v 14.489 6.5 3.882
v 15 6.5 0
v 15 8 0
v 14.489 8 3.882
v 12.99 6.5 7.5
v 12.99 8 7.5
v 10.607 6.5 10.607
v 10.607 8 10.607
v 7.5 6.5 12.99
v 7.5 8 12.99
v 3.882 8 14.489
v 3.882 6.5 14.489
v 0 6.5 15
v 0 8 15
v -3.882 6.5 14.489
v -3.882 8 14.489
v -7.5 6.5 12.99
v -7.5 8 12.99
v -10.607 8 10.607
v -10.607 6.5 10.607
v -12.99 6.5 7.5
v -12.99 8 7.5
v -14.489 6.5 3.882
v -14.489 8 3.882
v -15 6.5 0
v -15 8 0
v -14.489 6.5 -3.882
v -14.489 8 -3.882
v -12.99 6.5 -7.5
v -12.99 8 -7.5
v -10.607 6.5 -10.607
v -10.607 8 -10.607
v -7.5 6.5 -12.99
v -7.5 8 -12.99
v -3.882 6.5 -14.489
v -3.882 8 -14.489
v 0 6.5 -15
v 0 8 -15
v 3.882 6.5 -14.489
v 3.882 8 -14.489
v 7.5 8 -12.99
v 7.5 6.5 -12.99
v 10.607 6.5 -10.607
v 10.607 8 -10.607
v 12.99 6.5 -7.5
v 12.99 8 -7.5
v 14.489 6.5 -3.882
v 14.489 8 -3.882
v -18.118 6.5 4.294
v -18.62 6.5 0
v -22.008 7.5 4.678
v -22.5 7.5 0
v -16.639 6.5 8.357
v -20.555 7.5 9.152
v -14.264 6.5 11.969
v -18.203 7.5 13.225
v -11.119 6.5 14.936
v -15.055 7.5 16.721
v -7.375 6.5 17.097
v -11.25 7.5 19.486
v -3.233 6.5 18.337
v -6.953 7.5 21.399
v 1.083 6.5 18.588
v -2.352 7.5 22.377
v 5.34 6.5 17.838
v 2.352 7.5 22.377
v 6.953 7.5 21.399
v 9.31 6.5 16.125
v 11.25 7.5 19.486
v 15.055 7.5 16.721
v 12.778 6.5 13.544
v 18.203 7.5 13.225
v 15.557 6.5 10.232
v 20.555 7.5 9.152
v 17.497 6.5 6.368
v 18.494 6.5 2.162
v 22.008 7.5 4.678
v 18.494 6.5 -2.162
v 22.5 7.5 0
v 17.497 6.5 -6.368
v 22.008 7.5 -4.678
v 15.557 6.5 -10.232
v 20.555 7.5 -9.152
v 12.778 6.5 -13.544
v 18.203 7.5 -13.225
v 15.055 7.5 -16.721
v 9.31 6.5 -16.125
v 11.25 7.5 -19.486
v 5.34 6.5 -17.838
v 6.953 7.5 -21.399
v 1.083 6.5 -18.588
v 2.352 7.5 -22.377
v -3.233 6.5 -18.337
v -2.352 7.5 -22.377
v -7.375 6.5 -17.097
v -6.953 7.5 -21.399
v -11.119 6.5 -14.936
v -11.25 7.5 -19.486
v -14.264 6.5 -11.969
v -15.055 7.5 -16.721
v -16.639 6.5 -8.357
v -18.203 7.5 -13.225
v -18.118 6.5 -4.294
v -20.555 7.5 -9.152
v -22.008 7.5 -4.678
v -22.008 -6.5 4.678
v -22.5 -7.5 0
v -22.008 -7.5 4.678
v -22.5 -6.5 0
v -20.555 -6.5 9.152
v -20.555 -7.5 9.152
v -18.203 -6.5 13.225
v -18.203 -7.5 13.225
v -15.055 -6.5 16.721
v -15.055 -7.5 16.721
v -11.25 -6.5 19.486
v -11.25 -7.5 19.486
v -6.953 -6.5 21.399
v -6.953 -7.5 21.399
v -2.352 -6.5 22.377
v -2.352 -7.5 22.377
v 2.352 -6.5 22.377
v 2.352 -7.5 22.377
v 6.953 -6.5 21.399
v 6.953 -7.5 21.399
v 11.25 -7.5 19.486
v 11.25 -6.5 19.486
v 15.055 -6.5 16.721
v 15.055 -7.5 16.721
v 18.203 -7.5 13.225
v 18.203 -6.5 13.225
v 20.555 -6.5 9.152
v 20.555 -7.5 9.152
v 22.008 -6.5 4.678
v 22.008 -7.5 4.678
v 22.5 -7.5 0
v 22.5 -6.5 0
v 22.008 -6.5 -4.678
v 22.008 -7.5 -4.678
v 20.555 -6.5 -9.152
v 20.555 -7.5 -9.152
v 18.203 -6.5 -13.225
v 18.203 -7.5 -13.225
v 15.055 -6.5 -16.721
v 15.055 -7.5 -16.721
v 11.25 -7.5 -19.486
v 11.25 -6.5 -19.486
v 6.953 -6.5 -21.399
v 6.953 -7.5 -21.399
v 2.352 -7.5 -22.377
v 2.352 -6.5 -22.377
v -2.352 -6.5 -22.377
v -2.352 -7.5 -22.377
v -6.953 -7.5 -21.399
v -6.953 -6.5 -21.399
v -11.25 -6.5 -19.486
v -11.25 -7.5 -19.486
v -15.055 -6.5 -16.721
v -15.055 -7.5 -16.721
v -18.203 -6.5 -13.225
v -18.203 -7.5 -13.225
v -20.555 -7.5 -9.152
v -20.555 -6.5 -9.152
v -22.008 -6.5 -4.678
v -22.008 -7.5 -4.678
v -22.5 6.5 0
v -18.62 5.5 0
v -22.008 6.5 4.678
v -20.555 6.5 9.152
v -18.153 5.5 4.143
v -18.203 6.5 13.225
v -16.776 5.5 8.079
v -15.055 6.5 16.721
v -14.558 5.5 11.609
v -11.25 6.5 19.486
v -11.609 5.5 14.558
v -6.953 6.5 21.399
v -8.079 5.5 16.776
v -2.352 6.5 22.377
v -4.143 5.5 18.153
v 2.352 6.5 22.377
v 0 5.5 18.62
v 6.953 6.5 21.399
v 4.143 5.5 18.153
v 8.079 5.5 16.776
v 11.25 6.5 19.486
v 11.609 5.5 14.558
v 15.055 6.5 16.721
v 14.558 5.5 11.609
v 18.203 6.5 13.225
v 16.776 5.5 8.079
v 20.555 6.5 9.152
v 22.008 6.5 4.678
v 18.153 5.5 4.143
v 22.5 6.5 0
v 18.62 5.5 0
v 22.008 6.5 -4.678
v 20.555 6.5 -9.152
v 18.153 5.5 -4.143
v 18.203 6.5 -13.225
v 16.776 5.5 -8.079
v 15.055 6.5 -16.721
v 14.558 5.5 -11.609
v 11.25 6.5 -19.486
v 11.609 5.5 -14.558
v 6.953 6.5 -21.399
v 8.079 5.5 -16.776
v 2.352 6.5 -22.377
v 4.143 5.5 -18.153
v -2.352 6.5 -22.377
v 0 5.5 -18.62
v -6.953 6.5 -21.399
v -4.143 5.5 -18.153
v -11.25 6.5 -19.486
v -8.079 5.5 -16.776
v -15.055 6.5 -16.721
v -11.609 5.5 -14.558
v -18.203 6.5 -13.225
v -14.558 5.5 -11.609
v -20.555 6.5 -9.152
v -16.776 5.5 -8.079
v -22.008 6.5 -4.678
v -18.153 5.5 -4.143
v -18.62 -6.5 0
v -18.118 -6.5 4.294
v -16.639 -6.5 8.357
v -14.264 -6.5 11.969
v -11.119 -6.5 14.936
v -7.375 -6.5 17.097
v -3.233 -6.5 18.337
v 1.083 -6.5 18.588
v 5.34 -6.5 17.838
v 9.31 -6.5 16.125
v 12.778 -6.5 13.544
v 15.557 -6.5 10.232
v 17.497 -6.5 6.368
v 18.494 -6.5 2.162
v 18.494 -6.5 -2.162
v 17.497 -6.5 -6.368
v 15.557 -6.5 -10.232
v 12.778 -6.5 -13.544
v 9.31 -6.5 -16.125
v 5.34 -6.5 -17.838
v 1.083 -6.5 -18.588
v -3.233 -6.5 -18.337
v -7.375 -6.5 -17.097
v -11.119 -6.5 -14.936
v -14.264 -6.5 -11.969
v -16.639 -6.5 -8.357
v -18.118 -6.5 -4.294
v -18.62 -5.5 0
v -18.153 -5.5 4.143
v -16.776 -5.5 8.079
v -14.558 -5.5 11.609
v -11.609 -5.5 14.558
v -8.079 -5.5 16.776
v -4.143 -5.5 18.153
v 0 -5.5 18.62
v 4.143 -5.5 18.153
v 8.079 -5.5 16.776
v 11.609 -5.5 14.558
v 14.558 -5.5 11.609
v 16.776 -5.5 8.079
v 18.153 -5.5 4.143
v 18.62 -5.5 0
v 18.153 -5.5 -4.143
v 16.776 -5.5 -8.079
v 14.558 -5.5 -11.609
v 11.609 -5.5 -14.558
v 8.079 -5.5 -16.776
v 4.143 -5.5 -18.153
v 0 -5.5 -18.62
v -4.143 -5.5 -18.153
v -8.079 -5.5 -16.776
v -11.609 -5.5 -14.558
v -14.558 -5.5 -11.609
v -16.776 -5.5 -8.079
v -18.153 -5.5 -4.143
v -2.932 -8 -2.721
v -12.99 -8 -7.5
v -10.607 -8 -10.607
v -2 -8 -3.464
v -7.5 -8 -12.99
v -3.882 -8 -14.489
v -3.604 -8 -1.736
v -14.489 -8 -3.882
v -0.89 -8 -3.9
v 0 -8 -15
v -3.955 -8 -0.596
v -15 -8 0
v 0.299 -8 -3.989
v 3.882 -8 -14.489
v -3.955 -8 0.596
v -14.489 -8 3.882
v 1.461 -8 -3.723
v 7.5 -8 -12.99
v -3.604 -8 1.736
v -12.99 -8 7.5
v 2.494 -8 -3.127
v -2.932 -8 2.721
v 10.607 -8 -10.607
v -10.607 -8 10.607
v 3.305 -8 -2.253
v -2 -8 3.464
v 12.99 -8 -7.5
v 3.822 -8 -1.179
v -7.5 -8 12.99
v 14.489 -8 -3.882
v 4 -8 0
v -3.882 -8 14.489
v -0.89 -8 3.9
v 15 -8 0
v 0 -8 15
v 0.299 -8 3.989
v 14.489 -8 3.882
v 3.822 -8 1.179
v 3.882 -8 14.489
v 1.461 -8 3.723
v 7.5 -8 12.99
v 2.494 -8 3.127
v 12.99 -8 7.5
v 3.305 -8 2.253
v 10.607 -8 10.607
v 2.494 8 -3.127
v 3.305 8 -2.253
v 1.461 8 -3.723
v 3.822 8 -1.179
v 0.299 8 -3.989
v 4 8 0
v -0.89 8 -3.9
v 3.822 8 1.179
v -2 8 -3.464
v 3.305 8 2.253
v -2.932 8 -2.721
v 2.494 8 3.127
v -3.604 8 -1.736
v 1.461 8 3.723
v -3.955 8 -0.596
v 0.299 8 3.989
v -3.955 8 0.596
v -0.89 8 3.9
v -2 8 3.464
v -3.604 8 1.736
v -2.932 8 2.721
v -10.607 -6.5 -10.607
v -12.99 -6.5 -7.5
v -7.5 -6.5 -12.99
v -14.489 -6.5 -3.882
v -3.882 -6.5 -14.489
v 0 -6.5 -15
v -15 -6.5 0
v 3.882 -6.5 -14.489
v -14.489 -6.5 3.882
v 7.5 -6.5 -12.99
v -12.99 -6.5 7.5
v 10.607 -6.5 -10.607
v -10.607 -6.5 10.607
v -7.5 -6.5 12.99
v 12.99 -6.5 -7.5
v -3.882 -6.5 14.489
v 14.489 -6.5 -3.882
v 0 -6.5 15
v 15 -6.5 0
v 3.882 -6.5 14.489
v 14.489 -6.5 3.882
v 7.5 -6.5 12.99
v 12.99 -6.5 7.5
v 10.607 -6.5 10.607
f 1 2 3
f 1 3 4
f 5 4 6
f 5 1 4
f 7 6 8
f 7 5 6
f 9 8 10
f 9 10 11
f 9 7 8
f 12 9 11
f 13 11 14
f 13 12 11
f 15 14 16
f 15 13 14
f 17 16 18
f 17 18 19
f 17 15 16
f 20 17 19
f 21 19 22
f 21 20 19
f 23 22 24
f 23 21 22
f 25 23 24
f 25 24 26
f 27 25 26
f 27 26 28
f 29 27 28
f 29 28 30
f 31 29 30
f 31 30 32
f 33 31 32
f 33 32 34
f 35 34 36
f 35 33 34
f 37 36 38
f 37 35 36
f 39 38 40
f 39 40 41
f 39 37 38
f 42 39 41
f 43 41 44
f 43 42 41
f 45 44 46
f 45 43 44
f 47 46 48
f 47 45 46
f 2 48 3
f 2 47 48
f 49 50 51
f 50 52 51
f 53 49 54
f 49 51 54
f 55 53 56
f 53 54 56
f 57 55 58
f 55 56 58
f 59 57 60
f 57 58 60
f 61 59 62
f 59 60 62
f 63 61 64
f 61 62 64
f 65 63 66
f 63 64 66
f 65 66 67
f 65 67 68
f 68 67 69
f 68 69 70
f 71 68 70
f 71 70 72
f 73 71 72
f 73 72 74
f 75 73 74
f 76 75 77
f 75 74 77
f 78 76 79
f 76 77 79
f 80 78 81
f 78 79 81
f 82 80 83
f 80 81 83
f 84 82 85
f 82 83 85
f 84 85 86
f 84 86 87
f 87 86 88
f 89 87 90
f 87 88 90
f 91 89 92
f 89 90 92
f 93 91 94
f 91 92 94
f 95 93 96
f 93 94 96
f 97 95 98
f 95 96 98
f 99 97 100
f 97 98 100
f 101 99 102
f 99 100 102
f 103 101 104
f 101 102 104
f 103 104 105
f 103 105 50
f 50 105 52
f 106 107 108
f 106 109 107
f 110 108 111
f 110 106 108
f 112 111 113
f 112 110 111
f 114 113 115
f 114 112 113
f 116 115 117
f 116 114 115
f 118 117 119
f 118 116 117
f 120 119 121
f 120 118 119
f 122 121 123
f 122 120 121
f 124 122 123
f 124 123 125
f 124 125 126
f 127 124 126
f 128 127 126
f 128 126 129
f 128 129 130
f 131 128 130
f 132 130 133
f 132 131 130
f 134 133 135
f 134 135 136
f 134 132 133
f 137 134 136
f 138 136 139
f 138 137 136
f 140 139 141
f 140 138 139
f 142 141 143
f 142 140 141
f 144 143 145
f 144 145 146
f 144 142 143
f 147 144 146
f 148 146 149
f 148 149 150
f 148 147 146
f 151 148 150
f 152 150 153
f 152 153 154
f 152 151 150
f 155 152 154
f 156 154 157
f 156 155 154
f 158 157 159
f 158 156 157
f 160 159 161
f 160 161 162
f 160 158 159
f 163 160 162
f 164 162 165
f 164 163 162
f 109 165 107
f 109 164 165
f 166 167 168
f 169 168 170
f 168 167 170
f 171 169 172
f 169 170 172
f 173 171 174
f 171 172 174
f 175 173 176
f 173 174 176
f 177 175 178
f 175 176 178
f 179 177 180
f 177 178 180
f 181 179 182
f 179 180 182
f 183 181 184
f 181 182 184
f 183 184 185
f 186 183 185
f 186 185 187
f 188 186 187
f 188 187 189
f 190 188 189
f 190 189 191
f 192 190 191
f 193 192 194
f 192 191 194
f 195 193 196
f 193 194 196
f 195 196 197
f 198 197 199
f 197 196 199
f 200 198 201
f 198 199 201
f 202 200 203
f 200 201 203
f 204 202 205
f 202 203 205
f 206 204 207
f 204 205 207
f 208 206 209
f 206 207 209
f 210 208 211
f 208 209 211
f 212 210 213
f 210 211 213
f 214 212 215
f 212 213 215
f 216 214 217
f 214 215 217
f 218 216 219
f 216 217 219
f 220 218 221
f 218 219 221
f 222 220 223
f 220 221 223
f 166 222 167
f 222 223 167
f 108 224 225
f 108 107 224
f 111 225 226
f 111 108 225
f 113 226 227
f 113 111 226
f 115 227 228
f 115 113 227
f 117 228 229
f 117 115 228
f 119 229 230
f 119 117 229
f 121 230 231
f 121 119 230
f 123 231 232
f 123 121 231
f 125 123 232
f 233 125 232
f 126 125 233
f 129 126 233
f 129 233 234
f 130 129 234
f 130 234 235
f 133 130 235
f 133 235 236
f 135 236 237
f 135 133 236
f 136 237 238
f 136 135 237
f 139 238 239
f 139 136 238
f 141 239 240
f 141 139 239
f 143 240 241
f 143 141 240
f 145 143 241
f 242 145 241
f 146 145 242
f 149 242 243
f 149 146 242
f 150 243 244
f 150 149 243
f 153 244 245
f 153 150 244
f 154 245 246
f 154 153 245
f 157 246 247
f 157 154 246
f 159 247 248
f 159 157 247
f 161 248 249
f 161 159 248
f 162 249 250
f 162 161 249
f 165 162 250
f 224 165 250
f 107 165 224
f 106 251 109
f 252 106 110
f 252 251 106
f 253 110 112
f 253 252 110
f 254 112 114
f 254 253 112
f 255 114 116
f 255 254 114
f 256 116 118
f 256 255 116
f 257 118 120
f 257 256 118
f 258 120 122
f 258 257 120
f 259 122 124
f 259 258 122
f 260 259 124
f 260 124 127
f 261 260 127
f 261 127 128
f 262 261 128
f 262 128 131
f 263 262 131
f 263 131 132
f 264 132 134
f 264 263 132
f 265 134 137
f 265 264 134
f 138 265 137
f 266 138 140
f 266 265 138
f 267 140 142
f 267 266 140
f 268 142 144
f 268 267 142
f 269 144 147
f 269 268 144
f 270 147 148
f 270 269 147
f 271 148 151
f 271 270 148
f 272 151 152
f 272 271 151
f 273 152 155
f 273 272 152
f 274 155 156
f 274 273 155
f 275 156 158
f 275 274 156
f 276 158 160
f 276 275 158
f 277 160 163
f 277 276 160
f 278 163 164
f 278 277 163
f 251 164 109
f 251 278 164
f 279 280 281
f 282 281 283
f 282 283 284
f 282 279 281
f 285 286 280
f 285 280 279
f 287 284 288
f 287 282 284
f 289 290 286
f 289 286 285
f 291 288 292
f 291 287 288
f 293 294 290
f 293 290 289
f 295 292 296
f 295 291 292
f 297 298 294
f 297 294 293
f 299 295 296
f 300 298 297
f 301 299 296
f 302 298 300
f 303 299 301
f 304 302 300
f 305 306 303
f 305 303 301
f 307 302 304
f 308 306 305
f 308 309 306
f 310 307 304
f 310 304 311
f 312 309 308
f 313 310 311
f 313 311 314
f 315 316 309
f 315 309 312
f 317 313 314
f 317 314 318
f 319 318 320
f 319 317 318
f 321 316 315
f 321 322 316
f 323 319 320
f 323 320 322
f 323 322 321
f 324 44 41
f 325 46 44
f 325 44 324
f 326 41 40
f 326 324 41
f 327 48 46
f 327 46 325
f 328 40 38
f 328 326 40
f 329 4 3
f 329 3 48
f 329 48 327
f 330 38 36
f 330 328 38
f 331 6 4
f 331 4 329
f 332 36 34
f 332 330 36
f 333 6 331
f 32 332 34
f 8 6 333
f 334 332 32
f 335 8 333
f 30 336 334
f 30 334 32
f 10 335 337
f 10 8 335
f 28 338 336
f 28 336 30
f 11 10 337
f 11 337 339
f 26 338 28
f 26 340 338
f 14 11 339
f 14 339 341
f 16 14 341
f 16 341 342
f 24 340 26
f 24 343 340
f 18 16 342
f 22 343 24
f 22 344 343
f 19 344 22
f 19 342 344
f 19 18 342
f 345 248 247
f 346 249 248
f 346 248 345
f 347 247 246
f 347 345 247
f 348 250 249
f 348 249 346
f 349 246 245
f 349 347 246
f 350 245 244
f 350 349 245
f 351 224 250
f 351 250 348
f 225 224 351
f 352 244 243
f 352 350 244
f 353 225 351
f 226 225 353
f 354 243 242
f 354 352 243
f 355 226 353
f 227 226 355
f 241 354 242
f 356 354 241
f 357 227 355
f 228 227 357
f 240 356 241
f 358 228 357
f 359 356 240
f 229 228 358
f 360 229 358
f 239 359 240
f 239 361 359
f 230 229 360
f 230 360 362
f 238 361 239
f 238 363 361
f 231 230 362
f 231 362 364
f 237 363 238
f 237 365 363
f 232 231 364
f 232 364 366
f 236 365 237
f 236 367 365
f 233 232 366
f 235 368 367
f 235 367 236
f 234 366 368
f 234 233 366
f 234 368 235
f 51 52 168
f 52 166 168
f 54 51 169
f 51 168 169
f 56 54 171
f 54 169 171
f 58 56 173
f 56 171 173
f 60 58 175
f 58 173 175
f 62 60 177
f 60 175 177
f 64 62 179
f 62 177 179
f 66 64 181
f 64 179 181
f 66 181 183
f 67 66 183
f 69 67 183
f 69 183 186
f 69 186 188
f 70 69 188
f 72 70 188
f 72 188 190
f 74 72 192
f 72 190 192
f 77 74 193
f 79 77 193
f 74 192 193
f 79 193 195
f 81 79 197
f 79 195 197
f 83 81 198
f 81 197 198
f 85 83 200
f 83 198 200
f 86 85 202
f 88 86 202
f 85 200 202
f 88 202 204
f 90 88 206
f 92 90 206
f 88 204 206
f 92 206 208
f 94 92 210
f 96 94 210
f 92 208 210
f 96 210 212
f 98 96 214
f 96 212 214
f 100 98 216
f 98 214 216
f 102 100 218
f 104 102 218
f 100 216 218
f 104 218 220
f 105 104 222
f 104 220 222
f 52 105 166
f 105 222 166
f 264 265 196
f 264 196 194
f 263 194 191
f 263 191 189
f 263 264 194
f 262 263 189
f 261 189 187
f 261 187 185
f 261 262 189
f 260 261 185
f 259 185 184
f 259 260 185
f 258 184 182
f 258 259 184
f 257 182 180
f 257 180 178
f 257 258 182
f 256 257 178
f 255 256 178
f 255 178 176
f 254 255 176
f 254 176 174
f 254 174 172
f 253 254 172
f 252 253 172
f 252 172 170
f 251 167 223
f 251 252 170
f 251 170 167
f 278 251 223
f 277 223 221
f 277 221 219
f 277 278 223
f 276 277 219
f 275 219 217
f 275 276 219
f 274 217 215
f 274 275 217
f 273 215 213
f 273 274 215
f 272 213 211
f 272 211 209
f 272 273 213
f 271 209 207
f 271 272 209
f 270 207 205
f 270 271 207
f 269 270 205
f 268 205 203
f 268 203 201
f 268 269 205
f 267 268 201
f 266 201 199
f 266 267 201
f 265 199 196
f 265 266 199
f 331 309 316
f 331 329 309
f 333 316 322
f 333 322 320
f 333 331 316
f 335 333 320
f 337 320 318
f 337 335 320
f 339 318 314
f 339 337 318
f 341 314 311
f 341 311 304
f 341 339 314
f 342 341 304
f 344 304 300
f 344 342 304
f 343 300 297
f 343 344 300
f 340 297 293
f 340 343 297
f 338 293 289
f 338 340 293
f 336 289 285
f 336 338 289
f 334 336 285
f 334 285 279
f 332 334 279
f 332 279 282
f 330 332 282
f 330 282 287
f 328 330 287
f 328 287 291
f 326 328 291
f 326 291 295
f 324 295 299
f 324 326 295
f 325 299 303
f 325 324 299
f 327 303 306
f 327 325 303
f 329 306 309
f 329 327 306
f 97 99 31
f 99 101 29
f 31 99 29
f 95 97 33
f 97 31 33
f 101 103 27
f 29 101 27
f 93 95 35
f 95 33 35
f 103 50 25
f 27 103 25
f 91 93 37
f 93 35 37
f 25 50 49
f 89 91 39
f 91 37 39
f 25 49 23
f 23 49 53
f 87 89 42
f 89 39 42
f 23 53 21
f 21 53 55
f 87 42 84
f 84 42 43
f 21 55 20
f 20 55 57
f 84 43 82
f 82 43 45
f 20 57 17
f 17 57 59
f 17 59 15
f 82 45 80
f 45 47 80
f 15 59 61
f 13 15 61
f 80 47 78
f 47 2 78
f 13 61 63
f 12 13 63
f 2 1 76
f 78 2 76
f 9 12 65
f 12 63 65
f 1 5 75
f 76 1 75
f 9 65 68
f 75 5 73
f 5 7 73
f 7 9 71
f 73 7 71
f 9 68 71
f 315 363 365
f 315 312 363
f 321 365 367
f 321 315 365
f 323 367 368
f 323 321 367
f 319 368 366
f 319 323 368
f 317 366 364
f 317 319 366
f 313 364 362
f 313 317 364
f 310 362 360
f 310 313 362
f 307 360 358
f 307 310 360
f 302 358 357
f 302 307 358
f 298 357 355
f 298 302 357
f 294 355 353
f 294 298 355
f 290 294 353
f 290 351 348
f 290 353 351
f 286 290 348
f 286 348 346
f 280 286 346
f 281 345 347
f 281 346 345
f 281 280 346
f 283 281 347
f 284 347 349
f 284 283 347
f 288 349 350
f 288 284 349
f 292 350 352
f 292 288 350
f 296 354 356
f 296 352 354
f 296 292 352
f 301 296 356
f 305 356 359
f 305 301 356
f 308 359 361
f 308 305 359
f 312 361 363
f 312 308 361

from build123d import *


with BuildPart() as part:
    # 草圖1 → 旋轉1 (revolve)
    with BuildSketch(Plane.XY):
        Polygon((4, -8), (4, 8), (15, 8), (15, 5.5), (18.62, 5.5), (18.62, -5.5), (15, -5.5), (15, -8), align=None)
    revolve(axis=Axis((0, 49.340027701, 0), (0, -1, 0)))

    # 草圖7 → 旋轉2 (revolve)
    with BuildSketch(Plane.XY):
        Polygon((-22.5, -6.5), (-18.62, -5.5), (-15, -5.5), (-15, -6.5), (-18.62, -6.5), (-22.5, -7.5), align=None)
    revolve_2 = revolve(axis=Axis((0, 0, 0), (0, 1, 0)))

    # 鏡射1: 旋轉2 across plane
    add(revolve_2.mirror(Plane.ZX))


solid = part.part
